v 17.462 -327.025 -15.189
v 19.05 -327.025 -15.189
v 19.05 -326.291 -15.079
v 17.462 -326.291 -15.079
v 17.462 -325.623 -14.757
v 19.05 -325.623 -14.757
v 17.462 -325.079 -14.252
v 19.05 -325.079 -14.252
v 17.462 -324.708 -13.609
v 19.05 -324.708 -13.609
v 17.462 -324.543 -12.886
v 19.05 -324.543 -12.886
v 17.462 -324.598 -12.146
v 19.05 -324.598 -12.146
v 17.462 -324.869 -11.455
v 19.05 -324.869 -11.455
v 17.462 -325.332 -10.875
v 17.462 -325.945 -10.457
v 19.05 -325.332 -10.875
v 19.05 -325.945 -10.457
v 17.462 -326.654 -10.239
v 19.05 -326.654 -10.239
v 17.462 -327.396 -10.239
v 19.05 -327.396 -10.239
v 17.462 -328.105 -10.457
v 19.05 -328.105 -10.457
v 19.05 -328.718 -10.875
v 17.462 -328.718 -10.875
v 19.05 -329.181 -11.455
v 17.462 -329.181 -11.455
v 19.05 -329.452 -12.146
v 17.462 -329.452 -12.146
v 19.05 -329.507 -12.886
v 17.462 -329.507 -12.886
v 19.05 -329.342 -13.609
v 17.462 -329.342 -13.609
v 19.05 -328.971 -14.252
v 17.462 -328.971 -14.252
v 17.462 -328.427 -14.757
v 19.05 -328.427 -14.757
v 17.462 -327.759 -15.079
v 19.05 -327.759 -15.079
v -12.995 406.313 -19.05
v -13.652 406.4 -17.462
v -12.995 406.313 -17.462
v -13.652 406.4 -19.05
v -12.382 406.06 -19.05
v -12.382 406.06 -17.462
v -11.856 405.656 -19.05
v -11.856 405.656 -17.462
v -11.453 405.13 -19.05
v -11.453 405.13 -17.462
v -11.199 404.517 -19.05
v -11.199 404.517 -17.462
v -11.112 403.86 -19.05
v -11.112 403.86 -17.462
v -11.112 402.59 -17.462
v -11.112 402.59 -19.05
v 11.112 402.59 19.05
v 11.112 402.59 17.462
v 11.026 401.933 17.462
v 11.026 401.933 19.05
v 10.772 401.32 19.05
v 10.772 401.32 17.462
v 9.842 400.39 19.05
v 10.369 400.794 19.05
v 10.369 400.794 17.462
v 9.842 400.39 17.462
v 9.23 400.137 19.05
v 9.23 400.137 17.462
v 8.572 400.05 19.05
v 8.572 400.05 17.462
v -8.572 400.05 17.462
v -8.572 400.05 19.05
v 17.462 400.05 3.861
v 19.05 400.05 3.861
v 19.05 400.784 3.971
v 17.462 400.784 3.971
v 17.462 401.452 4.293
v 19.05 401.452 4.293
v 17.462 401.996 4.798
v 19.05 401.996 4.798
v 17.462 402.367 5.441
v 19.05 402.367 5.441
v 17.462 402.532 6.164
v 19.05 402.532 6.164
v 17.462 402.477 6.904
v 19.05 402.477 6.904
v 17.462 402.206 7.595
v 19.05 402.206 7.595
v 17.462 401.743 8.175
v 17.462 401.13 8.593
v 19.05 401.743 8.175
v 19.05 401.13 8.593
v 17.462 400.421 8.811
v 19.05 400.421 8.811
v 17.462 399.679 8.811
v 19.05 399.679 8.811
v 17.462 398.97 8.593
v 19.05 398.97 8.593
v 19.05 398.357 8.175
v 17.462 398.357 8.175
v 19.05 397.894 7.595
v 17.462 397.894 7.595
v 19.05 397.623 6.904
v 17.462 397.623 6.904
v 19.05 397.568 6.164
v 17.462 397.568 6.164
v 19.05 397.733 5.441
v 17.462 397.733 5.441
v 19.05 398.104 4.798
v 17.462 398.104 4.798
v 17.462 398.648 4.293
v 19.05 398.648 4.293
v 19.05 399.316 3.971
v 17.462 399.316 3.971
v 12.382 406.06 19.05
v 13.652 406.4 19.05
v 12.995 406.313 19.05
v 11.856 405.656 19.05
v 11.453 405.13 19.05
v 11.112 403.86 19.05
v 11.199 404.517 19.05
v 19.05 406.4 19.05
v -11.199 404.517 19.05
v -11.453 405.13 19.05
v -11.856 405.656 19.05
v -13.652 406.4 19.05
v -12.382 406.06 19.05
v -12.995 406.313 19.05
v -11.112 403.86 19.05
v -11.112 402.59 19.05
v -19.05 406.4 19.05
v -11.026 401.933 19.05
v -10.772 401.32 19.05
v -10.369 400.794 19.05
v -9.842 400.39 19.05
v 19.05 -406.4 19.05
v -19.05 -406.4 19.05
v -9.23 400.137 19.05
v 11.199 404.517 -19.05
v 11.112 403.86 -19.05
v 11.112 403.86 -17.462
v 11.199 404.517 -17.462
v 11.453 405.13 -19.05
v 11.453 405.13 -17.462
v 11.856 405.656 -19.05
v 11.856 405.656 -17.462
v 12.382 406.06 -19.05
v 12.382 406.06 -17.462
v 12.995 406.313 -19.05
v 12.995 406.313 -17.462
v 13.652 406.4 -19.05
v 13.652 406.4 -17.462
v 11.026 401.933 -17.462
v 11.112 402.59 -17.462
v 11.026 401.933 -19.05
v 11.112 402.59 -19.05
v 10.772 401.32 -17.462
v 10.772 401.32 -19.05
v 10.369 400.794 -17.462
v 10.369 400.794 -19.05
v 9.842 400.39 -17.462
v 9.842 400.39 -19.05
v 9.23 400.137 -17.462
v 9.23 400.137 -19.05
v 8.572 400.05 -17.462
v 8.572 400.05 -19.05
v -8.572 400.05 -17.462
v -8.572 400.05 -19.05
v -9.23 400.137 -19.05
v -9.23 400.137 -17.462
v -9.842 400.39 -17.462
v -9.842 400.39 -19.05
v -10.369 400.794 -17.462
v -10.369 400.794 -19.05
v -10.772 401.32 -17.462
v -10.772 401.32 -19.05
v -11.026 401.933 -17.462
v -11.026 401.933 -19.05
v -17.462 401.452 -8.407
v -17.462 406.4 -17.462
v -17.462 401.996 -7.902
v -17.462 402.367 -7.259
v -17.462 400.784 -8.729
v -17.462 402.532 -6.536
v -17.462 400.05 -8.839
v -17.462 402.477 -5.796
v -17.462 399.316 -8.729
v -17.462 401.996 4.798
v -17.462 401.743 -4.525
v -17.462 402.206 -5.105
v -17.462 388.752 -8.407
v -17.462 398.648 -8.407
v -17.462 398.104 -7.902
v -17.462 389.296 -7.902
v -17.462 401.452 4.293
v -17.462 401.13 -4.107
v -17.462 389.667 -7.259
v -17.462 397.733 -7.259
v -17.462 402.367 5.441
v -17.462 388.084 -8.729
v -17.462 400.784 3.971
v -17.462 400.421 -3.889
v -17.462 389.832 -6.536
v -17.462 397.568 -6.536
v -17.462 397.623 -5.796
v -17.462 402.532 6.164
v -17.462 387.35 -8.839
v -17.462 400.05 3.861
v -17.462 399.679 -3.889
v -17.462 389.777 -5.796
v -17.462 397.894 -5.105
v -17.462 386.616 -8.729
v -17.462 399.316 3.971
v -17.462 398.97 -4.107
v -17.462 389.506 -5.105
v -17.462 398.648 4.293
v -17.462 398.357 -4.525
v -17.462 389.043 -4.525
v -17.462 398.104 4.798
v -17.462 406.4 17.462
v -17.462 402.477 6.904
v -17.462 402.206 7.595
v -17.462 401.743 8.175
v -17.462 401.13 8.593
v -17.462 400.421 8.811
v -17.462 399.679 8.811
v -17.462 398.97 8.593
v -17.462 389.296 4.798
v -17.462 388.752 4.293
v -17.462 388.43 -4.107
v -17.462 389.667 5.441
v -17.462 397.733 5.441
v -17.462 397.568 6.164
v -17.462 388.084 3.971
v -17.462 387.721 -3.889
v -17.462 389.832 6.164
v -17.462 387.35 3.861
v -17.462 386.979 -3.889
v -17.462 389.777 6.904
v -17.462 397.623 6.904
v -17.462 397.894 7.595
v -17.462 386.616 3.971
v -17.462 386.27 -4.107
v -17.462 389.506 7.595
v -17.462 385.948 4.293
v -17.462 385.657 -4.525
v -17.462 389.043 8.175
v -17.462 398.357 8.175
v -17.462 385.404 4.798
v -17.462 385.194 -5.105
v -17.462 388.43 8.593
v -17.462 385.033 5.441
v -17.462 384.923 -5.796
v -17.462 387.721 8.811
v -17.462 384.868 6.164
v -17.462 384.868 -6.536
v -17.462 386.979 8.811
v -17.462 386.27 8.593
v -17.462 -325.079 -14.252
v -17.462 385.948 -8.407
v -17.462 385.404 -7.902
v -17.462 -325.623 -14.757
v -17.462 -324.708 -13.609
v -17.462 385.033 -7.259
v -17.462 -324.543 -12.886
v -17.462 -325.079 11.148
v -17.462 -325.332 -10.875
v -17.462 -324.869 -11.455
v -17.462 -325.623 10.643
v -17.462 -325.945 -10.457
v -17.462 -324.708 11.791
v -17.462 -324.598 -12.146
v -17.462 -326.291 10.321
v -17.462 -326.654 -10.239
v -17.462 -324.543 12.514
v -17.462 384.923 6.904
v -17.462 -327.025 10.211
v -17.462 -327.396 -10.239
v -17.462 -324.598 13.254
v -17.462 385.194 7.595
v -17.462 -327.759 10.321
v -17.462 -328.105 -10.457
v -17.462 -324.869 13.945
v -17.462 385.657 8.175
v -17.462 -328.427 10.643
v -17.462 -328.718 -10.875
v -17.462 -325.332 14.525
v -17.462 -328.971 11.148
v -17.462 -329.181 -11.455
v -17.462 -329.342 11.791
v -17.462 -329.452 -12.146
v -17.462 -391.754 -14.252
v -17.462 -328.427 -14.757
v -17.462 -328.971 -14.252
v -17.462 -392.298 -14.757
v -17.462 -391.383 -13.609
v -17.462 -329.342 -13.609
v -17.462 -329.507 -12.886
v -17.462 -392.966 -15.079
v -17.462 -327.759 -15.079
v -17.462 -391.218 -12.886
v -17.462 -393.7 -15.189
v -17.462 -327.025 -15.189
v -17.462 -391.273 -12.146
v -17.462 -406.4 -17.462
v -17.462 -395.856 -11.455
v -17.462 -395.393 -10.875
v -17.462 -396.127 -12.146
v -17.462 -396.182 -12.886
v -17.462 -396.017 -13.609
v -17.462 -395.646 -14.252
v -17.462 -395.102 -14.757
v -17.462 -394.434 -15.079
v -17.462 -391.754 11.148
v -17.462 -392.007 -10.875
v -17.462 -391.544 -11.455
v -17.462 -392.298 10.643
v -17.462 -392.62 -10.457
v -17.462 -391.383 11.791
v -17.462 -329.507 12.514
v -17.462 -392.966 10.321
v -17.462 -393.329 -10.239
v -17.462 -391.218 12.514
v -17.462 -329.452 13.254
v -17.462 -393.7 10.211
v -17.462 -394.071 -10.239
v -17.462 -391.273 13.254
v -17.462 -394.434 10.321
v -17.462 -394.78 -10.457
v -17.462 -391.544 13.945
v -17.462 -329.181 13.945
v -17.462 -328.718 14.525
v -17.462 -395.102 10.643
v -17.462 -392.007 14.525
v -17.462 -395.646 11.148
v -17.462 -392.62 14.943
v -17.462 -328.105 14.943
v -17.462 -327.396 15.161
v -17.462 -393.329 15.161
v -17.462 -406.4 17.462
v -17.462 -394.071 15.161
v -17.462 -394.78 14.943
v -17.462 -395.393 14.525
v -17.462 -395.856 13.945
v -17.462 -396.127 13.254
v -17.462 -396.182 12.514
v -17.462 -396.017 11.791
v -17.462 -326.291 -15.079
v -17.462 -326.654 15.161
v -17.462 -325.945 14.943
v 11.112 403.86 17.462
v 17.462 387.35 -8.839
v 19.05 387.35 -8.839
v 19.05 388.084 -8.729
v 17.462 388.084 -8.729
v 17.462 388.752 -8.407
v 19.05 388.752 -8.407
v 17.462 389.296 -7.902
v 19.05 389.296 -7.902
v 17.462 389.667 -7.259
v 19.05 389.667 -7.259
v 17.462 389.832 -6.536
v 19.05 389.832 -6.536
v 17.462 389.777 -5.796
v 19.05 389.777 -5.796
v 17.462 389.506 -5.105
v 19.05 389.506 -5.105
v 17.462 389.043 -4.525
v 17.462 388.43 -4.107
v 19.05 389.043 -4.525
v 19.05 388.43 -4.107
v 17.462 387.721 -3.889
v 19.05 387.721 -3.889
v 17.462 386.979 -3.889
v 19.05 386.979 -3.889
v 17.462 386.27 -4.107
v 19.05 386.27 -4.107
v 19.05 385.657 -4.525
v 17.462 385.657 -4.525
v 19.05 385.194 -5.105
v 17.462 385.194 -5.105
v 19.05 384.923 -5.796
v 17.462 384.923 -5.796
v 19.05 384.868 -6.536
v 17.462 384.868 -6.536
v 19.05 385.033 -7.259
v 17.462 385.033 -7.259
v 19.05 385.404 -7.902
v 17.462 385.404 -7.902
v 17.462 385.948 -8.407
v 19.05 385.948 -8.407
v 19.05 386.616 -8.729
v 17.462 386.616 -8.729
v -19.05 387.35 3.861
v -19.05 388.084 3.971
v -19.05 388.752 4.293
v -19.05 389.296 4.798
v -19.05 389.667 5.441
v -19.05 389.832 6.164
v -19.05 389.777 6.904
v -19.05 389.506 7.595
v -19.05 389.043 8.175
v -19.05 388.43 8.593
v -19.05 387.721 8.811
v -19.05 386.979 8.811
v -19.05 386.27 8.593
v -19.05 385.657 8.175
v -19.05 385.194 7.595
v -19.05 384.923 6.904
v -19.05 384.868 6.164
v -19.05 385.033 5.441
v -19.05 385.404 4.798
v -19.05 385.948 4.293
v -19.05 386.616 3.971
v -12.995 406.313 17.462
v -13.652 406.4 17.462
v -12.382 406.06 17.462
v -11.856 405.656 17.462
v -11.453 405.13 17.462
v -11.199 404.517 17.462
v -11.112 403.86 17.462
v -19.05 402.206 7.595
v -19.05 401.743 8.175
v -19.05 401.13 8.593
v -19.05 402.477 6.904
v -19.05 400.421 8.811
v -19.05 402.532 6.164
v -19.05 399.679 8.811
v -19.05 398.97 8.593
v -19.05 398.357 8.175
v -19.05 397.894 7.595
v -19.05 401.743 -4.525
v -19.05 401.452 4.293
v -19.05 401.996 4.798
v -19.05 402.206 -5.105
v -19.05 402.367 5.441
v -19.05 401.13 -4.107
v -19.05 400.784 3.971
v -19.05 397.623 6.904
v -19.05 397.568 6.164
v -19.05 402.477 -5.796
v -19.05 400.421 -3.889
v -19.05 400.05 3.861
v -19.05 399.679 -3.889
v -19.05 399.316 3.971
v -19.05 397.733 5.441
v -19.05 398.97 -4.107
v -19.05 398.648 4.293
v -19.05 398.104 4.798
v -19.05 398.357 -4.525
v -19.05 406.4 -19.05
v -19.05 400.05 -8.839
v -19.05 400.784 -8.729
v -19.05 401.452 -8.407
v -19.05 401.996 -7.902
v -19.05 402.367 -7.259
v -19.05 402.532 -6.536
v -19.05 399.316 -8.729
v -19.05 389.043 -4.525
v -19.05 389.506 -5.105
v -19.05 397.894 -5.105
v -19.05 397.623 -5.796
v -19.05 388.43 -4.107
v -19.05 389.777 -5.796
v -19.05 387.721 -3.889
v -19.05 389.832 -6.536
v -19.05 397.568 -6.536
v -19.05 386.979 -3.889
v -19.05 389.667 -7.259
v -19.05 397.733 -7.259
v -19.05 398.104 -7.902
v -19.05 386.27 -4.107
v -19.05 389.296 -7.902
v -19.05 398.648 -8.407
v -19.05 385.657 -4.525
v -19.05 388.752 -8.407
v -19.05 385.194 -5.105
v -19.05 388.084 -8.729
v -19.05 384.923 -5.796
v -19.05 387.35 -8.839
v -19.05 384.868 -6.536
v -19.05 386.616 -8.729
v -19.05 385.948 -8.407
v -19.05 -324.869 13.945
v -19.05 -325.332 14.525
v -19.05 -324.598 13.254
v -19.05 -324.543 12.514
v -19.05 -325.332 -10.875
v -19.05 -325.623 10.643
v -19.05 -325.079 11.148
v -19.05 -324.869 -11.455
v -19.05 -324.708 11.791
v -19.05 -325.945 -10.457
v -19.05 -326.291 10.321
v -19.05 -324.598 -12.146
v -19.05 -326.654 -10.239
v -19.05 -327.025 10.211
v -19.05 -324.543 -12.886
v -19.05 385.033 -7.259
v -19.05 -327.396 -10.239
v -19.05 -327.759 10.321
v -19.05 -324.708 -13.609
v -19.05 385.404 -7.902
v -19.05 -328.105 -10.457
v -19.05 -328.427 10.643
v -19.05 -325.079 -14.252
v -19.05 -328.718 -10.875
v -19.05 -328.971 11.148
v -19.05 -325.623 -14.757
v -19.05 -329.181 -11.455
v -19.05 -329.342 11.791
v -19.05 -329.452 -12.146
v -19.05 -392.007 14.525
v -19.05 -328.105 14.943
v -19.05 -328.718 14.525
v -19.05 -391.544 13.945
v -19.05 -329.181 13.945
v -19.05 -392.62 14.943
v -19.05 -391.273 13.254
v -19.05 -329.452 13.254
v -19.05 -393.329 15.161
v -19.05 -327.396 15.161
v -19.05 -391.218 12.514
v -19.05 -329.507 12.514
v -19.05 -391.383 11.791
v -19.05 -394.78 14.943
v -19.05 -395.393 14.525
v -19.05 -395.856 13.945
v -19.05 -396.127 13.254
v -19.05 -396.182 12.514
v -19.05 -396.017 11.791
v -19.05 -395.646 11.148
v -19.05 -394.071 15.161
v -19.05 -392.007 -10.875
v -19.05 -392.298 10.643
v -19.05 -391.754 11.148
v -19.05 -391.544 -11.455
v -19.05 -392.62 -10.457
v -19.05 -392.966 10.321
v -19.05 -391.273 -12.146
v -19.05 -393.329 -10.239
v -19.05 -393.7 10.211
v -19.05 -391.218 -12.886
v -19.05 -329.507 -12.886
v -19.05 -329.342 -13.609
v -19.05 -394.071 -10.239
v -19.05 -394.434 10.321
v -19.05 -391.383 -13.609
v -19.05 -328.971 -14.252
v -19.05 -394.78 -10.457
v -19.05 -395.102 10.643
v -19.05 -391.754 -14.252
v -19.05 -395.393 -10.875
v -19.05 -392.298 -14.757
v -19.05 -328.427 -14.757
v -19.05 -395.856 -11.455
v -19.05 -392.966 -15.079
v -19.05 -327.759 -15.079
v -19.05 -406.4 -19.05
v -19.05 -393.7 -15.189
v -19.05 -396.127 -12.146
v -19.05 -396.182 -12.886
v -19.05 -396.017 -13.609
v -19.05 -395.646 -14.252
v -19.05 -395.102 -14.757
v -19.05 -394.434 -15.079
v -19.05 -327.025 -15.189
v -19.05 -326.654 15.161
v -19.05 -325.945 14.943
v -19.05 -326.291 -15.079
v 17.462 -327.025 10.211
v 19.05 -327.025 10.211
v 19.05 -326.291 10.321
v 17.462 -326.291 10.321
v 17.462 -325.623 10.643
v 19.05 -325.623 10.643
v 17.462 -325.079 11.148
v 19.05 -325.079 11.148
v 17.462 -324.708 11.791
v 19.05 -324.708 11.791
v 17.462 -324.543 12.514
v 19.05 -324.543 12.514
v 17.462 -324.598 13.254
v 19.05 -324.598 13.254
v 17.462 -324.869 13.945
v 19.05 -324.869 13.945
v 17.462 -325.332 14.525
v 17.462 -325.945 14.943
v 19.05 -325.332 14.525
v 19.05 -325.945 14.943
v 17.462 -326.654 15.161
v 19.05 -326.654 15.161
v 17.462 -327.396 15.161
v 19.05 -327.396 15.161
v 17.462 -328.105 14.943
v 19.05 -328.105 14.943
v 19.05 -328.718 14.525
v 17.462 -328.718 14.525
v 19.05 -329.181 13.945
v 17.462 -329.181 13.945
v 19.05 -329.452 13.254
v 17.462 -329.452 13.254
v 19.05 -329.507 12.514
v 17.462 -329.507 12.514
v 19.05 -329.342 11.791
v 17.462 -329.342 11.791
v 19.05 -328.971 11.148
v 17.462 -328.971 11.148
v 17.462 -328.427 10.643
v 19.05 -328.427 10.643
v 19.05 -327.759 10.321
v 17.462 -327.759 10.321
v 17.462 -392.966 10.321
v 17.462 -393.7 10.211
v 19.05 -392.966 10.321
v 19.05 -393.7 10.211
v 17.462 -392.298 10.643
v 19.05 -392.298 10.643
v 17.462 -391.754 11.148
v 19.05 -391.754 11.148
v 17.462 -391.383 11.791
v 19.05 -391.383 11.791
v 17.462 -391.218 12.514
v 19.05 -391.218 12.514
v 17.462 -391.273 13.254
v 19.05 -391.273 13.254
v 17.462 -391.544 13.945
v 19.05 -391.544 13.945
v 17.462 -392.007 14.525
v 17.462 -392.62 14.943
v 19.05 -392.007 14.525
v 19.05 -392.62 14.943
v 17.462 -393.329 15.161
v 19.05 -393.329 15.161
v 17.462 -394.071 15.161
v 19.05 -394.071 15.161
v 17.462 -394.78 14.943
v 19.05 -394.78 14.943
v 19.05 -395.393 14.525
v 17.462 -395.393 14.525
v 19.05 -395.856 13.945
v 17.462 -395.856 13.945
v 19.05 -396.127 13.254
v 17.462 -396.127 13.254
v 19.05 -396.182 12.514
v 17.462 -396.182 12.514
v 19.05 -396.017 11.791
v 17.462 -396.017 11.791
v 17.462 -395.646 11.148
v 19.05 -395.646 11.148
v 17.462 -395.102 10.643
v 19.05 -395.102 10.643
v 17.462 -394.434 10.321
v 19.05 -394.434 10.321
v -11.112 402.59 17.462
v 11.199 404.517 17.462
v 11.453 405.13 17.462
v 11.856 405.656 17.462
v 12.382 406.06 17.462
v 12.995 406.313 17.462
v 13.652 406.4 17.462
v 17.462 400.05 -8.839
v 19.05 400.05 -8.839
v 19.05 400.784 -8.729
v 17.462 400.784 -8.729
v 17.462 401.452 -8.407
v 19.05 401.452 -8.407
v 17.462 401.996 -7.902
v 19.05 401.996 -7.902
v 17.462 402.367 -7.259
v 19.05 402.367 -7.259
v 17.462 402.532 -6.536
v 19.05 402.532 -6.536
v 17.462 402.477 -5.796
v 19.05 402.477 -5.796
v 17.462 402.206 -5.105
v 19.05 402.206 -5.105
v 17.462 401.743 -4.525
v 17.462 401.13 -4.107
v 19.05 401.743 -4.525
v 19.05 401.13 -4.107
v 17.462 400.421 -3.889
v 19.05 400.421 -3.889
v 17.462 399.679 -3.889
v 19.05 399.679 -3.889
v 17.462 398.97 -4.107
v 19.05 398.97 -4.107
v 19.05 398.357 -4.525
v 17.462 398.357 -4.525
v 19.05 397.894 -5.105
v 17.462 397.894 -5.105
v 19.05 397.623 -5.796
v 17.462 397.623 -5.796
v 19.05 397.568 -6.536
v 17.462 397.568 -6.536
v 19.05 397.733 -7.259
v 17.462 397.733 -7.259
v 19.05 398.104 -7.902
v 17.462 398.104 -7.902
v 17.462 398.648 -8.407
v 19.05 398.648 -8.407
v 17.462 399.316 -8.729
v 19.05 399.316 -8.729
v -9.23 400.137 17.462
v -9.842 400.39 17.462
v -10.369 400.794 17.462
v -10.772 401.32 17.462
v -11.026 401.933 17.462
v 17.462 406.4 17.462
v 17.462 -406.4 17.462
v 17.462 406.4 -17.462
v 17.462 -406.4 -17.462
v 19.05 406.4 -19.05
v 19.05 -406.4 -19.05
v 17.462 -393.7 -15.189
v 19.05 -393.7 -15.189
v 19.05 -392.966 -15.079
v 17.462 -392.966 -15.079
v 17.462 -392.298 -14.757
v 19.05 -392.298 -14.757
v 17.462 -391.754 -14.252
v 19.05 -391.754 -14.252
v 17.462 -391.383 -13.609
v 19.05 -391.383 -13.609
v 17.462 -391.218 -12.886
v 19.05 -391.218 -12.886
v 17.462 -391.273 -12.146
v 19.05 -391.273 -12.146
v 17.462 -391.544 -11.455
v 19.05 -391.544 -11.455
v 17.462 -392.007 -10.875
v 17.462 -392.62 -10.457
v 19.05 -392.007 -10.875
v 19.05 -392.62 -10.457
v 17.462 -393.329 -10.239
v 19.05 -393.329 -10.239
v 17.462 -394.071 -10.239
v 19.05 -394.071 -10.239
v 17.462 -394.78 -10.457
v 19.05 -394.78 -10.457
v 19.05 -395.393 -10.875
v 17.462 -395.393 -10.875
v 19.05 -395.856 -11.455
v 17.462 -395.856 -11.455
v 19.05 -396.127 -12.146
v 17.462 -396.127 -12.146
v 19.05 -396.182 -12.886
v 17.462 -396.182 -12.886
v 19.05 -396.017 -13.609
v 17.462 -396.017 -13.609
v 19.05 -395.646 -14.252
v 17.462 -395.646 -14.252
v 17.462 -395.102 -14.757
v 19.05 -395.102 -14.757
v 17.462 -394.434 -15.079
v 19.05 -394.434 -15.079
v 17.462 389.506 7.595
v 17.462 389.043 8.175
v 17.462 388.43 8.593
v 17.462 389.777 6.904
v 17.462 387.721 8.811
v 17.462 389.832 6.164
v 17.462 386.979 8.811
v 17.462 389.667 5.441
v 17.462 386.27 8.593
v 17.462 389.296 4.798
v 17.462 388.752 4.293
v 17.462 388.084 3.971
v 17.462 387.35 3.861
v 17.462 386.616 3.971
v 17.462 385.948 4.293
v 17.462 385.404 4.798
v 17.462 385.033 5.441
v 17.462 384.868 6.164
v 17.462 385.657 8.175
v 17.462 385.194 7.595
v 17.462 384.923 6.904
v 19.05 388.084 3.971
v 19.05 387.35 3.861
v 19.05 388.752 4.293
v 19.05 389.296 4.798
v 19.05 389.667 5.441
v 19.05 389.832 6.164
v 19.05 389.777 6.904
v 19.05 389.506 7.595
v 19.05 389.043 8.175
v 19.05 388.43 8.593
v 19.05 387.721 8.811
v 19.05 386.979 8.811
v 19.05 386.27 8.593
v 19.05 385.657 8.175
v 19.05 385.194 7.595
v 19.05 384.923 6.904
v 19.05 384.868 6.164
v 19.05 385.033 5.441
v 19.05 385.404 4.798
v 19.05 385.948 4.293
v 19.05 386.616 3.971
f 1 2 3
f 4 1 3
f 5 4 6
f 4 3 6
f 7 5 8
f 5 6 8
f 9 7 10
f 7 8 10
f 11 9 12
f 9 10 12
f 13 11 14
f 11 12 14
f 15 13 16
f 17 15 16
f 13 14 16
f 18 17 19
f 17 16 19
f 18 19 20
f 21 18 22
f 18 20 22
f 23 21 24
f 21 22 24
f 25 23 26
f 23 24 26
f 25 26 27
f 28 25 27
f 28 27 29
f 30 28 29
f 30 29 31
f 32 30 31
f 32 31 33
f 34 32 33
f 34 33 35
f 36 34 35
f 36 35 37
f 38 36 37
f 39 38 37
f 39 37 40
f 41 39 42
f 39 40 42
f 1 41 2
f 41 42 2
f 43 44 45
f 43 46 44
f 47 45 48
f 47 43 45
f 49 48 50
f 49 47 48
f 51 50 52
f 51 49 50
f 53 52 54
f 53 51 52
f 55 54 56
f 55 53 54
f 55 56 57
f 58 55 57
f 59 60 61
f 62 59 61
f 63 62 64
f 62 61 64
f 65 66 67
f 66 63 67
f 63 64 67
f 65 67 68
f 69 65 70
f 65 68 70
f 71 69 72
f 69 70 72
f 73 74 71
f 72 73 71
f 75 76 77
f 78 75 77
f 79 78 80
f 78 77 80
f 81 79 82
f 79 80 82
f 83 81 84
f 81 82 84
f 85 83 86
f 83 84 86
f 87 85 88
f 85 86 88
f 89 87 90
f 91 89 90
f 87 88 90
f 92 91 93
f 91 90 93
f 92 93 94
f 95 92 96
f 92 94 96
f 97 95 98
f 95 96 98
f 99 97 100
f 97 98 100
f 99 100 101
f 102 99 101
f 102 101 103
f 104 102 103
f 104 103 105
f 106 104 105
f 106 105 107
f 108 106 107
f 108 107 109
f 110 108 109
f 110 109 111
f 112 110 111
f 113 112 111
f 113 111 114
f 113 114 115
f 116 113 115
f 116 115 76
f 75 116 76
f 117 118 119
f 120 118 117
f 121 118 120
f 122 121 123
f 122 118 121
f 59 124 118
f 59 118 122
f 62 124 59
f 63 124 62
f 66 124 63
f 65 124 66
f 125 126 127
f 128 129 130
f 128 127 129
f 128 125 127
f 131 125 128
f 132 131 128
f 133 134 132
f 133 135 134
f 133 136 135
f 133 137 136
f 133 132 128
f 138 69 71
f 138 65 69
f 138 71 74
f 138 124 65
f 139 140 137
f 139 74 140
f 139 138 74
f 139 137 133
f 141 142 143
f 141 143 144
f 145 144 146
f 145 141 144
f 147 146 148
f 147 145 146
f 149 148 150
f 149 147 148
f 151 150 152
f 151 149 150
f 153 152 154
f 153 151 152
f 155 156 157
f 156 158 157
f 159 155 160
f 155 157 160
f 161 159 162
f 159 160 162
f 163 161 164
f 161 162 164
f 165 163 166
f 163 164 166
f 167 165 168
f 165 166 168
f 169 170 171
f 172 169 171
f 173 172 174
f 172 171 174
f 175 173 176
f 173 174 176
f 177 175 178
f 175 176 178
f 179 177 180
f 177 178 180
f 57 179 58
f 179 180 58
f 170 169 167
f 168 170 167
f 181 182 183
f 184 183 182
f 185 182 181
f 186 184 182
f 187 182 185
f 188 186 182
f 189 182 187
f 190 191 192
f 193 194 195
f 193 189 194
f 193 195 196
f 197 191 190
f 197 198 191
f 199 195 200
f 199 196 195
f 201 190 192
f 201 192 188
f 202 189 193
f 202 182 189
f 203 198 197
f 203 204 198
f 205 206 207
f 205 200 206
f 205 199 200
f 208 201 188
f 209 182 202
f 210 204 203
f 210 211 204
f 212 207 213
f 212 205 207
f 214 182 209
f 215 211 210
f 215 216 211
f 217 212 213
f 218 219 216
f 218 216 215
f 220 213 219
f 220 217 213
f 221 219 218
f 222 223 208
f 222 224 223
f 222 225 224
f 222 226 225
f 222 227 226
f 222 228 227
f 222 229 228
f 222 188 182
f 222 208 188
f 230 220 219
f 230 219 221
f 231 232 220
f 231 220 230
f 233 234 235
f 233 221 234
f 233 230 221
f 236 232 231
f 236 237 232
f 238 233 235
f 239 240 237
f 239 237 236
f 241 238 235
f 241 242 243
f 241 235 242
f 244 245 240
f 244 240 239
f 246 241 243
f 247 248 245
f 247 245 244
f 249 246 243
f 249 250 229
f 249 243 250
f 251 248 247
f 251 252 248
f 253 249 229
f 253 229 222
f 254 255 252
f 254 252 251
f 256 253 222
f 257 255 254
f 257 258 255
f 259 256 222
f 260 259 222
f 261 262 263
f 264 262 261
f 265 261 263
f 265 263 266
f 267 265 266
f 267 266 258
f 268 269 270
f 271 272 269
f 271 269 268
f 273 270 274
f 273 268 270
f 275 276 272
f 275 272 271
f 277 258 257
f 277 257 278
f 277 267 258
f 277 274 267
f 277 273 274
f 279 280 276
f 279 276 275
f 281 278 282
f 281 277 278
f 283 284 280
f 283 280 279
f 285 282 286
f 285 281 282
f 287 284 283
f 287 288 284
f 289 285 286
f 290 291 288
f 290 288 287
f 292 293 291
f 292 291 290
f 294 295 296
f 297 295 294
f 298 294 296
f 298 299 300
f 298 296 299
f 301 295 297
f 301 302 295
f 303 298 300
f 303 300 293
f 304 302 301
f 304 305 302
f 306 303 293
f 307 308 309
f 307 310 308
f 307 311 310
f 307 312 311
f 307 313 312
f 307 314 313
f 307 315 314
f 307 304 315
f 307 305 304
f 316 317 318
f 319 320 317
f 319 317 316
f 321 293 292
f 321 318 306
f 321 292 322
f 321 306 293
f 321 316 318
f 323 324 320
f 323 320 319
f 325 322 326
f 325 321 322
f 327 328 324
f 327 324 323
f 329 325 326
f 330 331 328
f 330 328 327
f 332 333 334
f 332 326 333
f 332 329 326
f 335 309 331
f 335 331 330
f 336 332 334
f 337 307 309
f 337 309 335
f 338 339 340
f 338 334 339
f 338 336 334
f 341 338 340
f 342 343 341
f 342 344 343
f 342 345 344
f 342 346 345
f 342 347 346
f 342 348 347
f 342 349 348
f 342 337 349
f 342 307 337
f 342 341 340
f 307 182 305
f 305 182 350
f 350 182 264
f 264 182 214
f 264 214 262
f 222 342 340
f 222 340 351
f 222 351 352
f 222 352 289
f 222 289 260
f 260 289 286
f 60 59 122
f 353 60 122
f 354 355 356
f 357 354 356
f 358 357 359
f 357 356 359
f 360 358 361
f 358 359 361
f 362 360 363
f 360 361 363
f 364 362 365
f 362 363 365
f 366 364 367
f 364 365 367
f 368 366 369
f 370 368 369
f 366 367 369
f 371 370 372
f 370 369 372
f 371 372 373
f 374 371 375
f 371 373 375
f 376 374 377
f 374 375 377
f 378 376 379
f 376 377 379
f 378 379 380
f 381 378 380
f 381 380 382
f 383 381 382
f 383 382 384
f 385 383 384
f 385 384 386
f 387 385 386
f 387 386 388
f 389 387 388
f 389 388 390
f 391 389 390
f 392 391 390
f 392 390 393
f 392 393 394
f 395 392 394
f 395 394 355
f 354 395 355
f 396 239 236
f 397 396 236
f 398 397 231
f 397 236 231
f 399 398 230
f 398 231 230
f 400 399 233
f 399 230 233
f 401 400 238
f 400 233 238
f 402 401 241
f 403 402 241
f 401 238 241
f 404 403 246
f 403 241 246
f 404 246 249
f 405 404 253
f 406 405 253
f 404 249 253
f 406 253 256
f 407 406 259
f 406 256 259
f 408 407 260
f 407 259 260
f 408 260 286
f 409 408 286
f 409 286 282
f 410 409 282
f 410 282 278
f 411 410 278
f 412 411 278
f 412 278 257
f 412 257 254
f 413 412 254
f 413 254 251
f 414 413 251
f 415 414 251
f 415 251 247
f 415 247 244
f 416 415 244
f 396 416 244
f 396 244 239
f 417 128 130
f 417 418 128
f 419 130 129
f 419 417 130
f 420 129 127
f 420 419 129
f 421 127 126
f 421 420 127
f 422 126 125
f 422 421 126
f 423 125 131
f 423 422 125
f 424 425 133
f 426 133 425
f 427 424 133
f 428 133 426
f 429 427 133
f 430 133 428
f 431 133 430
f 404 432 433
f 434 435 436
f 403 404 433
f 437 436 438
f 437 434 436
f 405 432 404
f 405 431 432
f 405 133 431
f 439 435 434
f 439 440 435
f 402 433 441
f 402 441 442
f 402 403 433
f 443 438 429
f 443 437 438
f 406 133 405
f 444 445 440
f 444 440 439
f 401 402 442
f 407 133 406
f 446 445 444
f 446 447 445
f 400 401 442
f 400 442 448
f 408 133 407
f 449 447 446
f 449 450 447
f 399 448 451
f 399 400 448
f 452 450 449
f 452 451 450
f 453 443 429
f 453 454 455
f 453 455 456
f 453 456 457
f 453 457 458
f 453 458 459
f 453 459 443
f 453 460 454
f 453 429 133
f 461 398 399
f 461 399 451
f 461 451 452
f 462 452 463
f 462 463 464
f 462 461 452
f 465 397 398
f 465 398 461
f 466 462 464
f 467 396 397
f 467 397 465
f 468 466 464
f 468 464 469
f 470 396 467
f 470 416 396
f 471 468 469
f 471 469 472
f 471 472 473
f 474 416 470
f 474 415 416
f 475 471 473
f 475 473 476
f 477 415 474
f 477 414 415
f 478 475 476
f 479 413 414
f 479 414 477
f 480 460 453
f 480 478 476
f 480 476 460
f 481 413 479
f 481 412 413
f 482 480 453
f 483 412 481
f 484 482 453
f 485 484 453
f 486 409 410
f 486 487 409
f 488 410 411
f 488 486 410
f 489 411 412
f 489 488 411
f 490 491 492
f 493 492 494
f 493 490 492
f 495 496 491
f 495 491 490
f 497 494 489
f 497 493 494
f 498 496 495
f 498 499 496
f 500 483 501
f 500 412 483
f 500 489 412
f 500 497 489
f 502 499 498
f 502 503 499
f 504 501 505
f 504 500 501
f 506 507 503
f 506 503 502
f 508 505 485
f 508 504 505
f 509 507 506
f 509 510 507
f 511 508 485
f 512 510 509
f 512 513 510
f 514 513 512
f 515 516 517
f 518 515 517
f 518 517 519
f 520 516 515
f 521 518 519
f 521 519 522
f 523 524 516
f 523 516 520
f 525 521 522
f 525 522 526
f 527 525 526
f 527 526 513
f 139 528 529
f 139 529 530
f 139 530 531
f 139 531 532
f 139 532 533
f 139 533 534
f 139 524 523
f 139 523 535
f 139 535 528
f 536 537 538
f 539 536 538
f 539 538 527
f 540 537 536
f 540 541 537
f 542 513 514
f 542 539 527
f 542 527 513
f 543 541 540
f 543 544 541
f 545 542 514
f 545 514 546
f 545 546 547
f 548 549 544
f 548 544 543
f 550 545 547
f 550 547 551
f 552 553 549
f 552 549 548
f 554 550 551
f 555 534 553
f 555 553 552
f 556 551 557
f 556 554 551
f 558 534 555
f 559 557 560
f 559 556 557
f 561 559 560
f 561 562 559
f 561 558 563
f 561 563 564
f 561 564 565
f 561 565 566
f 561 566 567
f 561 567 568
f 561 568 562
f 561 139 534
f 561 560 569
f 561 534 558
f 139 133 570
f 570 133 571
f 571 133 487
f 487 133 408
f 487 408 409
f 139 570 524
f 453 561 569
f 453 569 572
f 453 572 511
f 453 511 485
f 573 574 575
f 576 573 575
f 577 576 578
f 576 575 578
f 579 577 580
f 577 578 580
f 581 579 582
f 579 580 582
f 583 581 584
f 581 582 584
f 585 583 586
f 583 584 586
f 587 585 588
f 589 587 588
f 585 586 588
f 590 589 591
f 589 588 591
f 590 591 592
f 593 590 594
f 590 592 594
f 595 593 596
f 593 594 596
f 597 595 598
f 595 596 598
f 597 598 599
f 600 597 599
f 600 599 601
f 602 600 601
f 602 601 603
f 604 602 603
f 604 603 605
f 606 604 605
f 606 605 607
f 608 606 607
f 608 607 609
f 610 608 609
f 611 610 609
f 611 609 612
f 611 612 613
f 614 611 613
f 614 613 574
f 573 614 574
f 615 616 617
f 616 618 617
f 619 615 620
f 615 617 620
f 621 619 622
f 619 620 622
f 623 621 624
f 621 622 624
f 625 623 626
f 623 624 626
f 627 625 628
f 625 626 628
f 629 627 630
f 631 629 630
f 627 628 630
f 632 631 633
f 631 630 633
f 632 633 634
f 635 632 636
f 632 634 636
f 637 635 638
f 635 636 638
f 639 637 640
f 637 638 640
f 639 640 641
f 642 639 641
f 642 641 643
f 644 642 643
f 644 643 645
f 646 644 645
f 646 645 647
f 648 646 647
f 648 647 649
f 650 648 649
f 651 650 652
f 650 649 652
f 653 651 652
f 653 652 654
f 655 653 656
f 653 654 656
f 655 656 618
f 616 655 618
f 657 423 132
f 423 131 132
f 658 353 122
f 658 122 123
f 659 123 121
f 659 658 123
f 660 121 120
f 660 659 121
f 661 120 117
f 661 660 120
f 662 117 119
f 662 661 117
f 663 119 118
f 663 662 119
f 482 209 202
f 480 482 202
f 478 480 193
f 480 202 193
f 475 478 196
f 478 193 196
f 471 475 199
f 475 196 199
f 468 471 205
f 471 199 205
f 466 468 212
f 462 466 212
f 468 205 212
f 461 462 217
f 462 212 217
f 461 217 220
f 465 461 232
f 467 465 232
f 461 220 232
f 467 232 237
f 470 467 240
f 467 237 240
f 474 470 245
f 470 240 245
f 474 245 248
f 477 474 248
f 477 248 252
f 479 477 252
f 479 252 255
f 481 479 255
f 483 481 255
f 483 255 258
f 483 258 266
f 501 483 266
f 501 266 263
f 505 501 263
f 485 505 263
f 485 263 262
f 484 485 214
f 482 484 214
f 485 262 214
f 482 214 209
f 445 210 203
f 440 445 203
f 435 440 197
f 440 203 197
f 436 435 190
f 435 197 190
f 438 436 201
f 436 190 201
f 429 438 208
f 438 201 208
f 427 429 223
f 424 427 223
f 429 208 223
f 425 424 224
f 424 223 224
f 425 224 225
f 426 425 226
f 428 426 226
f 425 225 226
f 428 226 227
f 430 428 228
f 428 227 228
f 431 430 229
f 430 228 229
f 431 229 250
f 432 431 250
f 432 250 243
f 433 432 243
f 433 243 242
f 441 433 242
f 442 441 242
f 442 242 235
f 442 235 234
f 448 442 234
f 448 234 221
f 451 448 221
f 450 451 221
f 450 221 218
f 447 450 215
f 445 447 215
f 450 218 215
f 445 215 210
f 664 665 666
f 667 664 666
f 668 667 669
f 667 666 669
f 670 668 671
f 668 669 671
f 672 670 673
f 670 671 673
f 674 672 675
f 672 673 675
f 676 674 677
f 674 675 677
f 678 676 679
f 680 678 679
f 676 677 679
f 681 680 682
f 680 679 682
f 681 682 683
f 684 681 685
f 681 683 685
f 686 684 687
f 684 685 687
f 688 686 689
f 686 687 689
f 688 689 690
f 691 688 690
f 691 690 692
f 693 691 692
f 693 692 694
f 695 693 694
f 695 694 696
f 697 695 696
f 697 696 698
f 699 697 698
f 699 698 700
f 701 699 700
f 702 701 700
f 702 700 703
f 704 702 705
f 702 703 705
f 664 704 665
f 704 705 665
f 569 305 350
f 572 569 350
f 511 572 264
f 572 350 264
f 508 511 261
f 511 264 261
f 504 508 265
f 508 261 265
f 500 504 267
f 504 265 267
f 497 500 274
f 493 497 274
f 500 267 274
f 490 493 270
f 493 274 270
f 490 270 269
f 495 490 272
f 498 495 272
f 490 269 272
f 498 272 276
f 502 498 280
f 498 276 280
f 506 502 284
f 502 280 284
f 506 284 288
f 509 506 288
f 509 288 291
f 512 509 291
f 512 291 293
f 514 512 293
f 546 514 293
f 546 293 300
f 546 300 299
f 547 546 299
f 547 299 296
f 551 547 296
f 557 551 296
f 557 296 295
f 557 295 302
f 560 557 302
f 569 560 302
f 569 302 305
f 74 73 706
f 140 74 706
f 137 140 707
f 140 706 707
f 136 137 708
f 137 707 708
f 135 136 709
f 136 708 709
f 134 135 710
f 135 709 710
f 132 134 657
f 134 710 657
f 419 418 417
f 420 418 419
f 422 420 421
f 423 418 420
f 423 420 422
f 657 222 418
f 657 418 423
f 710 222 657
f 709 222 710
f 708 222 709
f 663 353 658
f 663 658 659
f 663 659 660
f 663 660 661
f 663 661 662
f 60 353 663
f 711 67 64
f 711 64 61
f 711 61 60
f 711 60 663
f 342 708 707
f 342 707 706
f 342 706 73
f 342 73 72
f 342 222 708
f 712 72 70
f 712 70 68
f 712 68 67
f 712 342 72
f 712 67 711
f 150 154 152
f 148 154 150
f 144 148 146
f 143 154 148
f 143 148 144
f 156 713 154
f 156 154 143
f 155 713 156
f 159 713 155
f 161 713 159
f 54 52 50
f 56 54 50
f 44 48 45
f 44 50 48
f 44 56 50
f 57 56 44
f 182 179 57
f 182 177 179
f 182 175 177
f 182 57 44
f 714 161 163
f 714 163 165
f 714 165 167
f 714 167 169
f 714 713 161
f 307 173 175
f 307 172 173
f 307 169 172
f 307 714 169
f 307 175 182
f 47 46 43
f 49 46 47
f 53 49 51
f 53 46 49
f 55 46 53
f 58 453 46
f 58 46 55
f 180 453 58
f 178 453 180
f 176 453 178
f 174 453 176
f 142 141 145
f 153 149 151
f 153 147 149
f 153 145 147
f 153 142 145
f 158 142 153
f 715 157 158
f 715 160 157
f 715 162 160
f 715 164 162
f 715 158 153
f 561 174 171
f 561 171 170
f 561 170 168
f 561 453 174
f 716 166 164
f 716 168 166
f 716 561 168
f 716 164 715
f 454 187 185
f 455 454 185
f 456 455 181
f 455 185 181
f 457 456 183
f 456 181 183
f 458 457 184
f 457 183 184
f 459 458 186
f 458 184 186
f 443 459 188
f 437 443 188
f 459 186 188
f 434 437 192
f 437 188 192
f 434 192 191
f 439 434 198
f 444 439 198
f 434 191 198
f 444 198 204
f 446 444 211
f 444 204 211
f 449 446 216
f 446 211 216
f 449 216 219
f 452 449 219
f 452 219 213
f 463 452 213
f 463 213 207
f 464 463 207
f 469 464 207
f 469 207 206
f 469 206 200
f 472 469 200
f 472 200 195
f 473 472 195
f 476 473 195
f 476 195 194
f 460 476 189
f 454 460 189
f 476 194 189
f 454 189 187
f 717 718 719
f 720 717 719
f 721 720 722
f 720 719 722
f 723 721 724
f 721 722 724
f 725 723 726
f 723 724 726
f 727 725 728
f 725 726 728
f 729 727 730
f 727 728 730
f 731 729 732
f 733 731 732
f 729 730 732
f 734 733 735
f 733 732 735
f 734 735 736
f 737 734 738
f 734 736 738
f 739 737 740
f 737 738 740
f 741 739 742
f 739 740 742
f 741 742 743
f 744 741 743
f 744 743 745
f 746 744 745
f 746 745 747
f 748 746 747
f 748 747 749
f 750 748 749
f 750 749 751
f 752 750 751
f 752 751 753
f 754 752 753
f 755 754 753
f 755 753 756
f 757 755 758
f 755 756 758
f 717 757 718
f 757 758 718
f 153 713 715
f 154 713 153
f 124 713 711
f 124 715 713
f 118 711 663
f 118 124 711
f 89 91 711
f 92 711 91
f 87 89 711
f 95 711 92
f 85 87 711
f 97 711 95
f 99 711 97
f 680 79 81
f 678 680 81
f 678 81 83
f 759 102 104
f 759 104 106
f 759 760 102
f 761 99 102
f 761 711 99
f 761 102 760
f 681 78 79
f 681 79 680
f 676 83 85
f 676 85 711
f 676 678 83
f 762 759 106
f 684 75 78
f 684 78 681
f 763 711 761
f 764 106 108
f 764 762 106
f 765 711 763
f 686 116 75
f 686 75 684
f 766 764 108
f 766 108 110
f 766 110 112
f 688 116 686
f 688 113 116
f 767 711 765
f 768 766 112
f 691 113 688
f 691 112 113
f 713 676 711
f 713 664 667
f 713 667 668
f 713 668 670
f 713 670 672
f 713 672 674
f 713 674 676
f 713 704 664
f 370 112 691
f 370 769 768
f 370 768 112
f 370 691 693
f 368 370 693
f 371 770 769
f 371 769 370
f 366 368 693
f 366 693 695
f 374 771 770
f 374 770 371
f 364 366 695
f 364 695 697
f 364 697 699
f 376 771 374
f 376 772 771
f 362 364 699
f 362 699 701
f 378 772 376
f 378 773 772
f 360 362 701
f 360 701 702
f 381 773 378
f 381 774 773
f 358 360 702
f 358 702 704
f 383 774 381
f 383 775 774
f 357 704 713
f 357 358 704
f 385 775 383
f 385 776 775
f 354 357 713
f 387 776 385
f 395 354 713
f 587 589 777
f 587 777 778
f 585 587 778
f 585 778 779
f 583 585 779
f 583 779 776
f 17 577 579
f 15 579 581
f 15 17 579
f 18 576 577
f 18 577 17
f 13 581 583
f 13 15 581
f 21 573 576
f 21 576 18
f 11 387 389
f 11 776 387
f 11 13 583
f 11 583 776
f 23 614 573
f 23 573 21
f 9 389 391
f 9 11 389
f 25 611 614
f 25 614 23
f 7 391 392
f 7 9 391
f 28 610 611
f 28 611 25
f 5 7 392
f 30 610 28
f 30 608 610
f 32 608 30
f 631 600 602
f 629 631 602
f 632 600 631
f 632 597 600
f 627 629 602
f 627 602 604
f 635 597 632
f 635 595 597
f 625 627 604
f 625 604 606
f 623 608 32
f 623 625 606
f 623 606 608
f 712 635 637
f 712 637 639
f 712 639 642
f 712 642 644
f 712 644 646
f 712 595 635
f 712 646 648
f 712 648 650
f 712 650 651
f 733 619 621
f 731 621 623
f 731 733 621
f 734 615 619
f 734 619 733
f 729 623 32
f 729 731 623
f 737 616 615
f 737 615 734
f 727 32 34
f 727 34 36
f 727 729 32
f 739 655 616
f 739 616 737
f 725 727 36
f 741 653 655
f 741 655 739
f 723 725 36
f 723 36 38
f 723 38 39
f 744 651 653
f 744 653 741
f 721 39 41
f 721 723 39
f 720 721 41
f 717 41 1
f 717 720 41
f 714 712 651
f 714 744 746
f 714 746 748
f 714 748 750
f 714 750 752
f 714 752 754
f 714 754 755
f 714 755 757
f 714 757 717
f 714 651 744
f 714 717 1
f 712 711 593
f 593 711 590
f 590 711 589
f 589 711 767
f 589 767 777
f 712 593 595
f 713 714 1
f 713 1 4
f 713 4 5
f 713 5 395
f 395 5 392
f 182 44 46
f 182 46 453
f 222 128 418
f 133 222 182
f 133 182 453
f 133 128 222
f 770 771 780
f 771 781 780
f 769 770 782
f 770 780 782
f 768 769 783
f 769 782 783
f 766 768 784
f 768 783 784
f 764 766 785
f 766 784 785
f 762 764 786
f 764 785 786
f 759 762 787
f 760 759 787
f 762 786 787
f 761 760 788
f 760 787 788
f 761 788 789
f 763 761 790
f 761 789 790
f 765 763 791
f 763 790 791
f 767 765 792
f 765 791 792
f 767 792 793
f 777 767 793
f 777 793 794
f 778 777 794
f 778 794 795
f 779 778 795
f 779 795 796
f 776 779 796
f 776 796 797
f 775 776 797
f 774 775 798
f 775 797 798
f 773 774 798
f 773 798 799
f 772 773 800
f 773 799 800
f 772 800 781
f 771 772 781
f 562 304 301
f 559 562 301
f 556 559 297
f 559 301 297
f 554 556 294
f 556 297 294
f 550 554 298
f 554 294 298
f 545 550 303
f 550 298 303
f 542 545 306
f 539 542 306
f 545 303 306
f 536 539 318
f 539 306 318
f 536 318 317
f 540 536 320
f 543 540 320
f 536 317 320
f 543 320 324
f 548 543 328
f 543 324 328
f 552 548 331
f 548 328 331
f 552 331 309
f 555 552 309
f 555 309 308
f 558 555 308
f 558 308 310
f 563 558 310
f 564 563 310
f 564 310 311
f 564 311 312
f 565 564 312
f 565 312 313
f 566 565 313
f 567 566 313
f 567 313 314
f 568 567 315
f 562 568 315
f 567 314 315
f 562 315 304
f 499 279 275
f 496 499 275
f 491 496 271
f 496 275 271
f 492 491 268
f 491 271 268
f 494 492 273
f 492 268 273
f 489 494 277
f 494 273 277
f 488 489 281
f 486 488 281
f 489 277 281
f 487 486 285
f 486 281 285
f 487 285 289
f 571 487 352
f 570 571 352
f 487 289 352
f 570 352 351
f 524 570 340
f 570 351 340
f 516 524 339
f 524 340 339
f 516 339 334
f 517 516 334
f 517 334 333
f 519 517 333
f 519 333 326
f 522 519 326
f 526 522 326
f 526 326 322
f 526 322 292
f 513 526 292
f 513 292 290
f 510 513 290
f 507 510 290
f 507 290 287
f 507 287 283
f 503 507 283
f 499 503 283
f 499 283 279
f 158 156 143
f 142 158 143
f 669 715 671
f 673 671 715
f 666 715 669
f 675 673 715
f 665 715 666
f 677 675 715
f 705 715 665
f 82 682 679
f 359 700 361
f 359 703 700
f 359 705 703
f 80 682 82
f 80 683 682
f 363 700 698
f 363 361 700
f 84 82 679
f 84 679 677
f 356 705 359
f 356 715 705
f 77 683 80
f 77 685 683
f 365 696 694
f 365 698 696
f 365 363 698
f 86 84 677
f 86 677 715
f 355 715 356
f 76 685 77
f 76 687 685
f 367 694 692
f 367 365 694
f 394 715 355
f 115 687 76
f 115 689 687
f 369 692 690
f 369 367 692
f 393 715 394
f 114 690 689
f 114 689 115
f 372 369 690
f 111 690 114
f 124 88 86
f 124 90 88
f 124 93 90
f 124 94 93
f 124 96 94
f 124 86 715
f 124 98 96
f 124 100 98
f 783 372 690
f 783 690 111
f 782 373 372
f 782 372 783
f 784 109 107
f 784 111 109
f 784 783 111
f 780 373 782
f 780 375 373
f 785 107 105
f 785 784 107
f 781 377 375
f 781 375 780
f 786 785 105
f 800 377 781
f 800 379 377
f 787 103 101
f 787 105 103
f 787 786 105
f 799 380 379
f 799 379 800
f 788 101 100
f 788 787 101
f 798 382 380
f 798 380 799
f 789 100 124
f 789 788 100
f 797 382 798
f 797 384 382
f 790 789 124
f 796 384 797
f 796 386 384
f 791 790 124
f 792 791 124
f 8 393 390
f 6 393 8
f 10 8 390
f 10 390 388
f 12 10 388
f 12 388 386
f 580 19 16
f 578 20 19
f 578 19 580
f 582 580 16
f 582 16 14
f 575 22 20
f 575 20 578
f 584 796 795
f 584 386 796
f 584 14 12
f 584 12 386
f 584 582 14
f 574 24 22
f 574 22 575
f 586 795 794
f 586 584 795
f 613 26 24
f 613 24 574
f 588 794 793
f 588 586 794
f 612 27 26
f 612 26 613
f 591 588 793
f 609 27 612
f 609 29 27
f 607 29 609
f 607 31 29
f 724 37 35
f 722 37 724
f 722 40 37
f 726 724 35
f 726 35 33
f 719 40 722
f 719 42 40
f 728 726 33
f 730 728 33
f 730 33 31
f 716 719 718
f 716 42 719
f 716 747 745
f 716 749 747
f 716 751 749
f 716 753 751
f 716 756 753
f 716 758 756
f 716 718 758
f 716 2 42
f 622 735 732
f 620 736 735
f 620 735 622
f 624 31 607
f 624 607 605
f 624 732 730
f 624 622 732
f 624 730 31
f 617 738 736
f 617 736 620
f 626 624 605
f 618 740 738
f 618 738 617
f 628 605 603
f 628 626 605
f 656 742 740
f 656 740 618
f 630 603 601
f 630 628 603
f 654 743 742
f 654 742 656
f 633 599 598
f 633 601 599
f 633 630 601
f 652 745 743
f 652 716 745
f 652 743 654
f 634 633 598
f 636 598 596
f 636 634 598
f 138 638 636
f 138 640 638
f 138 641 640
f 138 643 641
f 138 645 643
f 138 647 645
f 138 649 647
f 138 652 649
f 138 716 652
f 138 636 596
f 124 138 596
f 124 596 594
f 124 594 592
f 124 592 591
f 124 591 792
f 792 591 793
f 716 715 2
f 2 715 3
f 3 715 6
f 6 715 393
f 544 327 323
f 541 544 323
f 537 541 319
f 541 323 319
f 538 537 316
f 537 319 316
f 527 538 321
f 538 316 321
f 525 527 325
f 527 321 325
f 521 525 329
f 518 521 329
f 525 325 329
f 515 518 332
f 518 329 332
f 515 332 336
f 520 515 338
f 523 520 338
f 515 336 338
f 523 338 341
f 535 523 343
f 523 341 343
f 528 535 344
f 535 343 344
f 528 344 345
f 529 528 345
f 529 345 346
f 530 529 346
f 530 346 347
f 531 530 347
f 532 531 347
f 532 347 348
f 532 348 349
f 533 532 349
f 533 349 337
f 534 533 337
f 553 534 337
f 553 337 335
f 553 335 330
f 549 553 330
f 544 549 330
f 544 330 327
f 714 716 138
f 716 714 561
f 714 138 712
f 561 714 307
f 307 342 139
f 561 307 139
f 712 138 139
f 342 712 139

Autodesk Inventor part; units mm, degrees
ref_plane "YZ Plane" through (0, 0, 0) normal (1, 0, 0) x (0, 1, 0)
ref_plane "XZ Plane" through (0, 0, 0) normal (0, 1, 0) x (-1, 0, 0)
ref_plane "XY Plane" through (0, 0, 0) normal (0, 0, 1) x (1, 0, 0)
sketch "Sketch1" plane through (0, 0, 0) normal (0, 1, 0) x (-1, 0, 0)
  line L0 (-19.05, 19.05) -> (19.05, 19.05)
  line L1 (19.05, 19.05) -> (19.05, -19.05)
  line L2 (19.05, -19.05) -> (-19.05, -19.05)
  line L3 (-19.05, -19.05) -> (-19.05, 19.05)
  line L4 (-19.05, 19.05) -> (19.05, -19.05) construction
  line L5 (19.05, 19.05) -> (-19.05, -19.05) construction
  line L6 (17.4625, -17.4625) -> (17.4625, 17.4625)
  line L7 (17.4625, 17.4625) -> (-17.4625, 17.4625)
  line L8 (-17.4625, 17.4625) -> (-17.4625, -17.4625)
  line L9 (-17.4625, -17.4625) -> (17.4625, -17.4625)
  point P0 (0, 0)
  dimension "d0" = 38.1
  dimension "d1" = 1.5875
extrude "Extrusion1" add sketch "Sketch1" along normal mid plane 812.8
sketch "Sketch2" plane through (19.05, -406.4, -19.05) normal (1, 0, 0) x (0, 0, -1)
  circle A0 centre (-25.4, 806.45) radius 2.4892
  circle A1 centre (-25.4, 793.75) radius 2.4892
  circle A2 centre (-12.7, 793.75) radius 2.4892
  circle A3 centre (-12.7, 806.45) radius 2.4892
  line L0 (-38.1, 812.8) -> (0, 812.8) projected
  circle A4 centre (-31.75, 12.7) radius 2.4892
  circle A5 centre (-6.35, 12.7) radius 2.4892
  circle A6 centre (-6.35, 79.375) radius 2.4892
  circle A7 centre (-31.75, 79.375) radius 2.4892
  line L1 (0, 0) -> (-38.1, 0) projected
  line L2 (-38.1, 0) -> (-38.1, 812.8) projected
  point P0 (-19.05, 800.1)
  point P1 (-19.05, 812.8)
  dimension "d4" = 4.9784
  dimension "d7" = 360
  dimension "d9" = 12.7
  dimension "d10" = 6.35
  dimension "d11" = 4.9784
  dimension "d12" = 66.675
  dimension "d13" = 12.7
  dimension "d14" = 25.4
  dimension "d15" = 6.35
extrude "Extrusion2" cut sketch "Sketch2" against normal through all
sketch "Sketch3" plane through (-19.05, 406.4, 19.05) normal (0, 0, 1) x (1, 0, 0)
  line L0 (0, 0) -> (38.1, 0) projected
  line L1 (7.9375, 0) -> (7.9375, -6.35)
  line L2 (7.9375, -6.35) -> (30.1625, -6.35)
  line L3 (30.1625, -6.35) -> (30.1625, 0)
  point P0 (19.05, -6.35)
  point P1 (19.05, 0)
  dimension "d18" = 22.225
  dimension "d19" = 6.35
extrude "Extrusion3" cut sketch "Sketch3" against normal through all
fillet "Fillet1" radius 2.54 8 edges at (-11.1125, 406.4, 18.2562) (-11.1125, 400.05, 18.2562) (11.1125, 400.05, 18.2562) (11.1125, 406.4, 18.2562) (-11.1125, 406.4, -18.2562) (-11.1125, 400.05, -18.2562) (11.1125, 406.4, -18.2562) (11.1125, 400.05, -18.2562)
properties part number "GreyT 2x1 Template" material "Aluminum 6061"
